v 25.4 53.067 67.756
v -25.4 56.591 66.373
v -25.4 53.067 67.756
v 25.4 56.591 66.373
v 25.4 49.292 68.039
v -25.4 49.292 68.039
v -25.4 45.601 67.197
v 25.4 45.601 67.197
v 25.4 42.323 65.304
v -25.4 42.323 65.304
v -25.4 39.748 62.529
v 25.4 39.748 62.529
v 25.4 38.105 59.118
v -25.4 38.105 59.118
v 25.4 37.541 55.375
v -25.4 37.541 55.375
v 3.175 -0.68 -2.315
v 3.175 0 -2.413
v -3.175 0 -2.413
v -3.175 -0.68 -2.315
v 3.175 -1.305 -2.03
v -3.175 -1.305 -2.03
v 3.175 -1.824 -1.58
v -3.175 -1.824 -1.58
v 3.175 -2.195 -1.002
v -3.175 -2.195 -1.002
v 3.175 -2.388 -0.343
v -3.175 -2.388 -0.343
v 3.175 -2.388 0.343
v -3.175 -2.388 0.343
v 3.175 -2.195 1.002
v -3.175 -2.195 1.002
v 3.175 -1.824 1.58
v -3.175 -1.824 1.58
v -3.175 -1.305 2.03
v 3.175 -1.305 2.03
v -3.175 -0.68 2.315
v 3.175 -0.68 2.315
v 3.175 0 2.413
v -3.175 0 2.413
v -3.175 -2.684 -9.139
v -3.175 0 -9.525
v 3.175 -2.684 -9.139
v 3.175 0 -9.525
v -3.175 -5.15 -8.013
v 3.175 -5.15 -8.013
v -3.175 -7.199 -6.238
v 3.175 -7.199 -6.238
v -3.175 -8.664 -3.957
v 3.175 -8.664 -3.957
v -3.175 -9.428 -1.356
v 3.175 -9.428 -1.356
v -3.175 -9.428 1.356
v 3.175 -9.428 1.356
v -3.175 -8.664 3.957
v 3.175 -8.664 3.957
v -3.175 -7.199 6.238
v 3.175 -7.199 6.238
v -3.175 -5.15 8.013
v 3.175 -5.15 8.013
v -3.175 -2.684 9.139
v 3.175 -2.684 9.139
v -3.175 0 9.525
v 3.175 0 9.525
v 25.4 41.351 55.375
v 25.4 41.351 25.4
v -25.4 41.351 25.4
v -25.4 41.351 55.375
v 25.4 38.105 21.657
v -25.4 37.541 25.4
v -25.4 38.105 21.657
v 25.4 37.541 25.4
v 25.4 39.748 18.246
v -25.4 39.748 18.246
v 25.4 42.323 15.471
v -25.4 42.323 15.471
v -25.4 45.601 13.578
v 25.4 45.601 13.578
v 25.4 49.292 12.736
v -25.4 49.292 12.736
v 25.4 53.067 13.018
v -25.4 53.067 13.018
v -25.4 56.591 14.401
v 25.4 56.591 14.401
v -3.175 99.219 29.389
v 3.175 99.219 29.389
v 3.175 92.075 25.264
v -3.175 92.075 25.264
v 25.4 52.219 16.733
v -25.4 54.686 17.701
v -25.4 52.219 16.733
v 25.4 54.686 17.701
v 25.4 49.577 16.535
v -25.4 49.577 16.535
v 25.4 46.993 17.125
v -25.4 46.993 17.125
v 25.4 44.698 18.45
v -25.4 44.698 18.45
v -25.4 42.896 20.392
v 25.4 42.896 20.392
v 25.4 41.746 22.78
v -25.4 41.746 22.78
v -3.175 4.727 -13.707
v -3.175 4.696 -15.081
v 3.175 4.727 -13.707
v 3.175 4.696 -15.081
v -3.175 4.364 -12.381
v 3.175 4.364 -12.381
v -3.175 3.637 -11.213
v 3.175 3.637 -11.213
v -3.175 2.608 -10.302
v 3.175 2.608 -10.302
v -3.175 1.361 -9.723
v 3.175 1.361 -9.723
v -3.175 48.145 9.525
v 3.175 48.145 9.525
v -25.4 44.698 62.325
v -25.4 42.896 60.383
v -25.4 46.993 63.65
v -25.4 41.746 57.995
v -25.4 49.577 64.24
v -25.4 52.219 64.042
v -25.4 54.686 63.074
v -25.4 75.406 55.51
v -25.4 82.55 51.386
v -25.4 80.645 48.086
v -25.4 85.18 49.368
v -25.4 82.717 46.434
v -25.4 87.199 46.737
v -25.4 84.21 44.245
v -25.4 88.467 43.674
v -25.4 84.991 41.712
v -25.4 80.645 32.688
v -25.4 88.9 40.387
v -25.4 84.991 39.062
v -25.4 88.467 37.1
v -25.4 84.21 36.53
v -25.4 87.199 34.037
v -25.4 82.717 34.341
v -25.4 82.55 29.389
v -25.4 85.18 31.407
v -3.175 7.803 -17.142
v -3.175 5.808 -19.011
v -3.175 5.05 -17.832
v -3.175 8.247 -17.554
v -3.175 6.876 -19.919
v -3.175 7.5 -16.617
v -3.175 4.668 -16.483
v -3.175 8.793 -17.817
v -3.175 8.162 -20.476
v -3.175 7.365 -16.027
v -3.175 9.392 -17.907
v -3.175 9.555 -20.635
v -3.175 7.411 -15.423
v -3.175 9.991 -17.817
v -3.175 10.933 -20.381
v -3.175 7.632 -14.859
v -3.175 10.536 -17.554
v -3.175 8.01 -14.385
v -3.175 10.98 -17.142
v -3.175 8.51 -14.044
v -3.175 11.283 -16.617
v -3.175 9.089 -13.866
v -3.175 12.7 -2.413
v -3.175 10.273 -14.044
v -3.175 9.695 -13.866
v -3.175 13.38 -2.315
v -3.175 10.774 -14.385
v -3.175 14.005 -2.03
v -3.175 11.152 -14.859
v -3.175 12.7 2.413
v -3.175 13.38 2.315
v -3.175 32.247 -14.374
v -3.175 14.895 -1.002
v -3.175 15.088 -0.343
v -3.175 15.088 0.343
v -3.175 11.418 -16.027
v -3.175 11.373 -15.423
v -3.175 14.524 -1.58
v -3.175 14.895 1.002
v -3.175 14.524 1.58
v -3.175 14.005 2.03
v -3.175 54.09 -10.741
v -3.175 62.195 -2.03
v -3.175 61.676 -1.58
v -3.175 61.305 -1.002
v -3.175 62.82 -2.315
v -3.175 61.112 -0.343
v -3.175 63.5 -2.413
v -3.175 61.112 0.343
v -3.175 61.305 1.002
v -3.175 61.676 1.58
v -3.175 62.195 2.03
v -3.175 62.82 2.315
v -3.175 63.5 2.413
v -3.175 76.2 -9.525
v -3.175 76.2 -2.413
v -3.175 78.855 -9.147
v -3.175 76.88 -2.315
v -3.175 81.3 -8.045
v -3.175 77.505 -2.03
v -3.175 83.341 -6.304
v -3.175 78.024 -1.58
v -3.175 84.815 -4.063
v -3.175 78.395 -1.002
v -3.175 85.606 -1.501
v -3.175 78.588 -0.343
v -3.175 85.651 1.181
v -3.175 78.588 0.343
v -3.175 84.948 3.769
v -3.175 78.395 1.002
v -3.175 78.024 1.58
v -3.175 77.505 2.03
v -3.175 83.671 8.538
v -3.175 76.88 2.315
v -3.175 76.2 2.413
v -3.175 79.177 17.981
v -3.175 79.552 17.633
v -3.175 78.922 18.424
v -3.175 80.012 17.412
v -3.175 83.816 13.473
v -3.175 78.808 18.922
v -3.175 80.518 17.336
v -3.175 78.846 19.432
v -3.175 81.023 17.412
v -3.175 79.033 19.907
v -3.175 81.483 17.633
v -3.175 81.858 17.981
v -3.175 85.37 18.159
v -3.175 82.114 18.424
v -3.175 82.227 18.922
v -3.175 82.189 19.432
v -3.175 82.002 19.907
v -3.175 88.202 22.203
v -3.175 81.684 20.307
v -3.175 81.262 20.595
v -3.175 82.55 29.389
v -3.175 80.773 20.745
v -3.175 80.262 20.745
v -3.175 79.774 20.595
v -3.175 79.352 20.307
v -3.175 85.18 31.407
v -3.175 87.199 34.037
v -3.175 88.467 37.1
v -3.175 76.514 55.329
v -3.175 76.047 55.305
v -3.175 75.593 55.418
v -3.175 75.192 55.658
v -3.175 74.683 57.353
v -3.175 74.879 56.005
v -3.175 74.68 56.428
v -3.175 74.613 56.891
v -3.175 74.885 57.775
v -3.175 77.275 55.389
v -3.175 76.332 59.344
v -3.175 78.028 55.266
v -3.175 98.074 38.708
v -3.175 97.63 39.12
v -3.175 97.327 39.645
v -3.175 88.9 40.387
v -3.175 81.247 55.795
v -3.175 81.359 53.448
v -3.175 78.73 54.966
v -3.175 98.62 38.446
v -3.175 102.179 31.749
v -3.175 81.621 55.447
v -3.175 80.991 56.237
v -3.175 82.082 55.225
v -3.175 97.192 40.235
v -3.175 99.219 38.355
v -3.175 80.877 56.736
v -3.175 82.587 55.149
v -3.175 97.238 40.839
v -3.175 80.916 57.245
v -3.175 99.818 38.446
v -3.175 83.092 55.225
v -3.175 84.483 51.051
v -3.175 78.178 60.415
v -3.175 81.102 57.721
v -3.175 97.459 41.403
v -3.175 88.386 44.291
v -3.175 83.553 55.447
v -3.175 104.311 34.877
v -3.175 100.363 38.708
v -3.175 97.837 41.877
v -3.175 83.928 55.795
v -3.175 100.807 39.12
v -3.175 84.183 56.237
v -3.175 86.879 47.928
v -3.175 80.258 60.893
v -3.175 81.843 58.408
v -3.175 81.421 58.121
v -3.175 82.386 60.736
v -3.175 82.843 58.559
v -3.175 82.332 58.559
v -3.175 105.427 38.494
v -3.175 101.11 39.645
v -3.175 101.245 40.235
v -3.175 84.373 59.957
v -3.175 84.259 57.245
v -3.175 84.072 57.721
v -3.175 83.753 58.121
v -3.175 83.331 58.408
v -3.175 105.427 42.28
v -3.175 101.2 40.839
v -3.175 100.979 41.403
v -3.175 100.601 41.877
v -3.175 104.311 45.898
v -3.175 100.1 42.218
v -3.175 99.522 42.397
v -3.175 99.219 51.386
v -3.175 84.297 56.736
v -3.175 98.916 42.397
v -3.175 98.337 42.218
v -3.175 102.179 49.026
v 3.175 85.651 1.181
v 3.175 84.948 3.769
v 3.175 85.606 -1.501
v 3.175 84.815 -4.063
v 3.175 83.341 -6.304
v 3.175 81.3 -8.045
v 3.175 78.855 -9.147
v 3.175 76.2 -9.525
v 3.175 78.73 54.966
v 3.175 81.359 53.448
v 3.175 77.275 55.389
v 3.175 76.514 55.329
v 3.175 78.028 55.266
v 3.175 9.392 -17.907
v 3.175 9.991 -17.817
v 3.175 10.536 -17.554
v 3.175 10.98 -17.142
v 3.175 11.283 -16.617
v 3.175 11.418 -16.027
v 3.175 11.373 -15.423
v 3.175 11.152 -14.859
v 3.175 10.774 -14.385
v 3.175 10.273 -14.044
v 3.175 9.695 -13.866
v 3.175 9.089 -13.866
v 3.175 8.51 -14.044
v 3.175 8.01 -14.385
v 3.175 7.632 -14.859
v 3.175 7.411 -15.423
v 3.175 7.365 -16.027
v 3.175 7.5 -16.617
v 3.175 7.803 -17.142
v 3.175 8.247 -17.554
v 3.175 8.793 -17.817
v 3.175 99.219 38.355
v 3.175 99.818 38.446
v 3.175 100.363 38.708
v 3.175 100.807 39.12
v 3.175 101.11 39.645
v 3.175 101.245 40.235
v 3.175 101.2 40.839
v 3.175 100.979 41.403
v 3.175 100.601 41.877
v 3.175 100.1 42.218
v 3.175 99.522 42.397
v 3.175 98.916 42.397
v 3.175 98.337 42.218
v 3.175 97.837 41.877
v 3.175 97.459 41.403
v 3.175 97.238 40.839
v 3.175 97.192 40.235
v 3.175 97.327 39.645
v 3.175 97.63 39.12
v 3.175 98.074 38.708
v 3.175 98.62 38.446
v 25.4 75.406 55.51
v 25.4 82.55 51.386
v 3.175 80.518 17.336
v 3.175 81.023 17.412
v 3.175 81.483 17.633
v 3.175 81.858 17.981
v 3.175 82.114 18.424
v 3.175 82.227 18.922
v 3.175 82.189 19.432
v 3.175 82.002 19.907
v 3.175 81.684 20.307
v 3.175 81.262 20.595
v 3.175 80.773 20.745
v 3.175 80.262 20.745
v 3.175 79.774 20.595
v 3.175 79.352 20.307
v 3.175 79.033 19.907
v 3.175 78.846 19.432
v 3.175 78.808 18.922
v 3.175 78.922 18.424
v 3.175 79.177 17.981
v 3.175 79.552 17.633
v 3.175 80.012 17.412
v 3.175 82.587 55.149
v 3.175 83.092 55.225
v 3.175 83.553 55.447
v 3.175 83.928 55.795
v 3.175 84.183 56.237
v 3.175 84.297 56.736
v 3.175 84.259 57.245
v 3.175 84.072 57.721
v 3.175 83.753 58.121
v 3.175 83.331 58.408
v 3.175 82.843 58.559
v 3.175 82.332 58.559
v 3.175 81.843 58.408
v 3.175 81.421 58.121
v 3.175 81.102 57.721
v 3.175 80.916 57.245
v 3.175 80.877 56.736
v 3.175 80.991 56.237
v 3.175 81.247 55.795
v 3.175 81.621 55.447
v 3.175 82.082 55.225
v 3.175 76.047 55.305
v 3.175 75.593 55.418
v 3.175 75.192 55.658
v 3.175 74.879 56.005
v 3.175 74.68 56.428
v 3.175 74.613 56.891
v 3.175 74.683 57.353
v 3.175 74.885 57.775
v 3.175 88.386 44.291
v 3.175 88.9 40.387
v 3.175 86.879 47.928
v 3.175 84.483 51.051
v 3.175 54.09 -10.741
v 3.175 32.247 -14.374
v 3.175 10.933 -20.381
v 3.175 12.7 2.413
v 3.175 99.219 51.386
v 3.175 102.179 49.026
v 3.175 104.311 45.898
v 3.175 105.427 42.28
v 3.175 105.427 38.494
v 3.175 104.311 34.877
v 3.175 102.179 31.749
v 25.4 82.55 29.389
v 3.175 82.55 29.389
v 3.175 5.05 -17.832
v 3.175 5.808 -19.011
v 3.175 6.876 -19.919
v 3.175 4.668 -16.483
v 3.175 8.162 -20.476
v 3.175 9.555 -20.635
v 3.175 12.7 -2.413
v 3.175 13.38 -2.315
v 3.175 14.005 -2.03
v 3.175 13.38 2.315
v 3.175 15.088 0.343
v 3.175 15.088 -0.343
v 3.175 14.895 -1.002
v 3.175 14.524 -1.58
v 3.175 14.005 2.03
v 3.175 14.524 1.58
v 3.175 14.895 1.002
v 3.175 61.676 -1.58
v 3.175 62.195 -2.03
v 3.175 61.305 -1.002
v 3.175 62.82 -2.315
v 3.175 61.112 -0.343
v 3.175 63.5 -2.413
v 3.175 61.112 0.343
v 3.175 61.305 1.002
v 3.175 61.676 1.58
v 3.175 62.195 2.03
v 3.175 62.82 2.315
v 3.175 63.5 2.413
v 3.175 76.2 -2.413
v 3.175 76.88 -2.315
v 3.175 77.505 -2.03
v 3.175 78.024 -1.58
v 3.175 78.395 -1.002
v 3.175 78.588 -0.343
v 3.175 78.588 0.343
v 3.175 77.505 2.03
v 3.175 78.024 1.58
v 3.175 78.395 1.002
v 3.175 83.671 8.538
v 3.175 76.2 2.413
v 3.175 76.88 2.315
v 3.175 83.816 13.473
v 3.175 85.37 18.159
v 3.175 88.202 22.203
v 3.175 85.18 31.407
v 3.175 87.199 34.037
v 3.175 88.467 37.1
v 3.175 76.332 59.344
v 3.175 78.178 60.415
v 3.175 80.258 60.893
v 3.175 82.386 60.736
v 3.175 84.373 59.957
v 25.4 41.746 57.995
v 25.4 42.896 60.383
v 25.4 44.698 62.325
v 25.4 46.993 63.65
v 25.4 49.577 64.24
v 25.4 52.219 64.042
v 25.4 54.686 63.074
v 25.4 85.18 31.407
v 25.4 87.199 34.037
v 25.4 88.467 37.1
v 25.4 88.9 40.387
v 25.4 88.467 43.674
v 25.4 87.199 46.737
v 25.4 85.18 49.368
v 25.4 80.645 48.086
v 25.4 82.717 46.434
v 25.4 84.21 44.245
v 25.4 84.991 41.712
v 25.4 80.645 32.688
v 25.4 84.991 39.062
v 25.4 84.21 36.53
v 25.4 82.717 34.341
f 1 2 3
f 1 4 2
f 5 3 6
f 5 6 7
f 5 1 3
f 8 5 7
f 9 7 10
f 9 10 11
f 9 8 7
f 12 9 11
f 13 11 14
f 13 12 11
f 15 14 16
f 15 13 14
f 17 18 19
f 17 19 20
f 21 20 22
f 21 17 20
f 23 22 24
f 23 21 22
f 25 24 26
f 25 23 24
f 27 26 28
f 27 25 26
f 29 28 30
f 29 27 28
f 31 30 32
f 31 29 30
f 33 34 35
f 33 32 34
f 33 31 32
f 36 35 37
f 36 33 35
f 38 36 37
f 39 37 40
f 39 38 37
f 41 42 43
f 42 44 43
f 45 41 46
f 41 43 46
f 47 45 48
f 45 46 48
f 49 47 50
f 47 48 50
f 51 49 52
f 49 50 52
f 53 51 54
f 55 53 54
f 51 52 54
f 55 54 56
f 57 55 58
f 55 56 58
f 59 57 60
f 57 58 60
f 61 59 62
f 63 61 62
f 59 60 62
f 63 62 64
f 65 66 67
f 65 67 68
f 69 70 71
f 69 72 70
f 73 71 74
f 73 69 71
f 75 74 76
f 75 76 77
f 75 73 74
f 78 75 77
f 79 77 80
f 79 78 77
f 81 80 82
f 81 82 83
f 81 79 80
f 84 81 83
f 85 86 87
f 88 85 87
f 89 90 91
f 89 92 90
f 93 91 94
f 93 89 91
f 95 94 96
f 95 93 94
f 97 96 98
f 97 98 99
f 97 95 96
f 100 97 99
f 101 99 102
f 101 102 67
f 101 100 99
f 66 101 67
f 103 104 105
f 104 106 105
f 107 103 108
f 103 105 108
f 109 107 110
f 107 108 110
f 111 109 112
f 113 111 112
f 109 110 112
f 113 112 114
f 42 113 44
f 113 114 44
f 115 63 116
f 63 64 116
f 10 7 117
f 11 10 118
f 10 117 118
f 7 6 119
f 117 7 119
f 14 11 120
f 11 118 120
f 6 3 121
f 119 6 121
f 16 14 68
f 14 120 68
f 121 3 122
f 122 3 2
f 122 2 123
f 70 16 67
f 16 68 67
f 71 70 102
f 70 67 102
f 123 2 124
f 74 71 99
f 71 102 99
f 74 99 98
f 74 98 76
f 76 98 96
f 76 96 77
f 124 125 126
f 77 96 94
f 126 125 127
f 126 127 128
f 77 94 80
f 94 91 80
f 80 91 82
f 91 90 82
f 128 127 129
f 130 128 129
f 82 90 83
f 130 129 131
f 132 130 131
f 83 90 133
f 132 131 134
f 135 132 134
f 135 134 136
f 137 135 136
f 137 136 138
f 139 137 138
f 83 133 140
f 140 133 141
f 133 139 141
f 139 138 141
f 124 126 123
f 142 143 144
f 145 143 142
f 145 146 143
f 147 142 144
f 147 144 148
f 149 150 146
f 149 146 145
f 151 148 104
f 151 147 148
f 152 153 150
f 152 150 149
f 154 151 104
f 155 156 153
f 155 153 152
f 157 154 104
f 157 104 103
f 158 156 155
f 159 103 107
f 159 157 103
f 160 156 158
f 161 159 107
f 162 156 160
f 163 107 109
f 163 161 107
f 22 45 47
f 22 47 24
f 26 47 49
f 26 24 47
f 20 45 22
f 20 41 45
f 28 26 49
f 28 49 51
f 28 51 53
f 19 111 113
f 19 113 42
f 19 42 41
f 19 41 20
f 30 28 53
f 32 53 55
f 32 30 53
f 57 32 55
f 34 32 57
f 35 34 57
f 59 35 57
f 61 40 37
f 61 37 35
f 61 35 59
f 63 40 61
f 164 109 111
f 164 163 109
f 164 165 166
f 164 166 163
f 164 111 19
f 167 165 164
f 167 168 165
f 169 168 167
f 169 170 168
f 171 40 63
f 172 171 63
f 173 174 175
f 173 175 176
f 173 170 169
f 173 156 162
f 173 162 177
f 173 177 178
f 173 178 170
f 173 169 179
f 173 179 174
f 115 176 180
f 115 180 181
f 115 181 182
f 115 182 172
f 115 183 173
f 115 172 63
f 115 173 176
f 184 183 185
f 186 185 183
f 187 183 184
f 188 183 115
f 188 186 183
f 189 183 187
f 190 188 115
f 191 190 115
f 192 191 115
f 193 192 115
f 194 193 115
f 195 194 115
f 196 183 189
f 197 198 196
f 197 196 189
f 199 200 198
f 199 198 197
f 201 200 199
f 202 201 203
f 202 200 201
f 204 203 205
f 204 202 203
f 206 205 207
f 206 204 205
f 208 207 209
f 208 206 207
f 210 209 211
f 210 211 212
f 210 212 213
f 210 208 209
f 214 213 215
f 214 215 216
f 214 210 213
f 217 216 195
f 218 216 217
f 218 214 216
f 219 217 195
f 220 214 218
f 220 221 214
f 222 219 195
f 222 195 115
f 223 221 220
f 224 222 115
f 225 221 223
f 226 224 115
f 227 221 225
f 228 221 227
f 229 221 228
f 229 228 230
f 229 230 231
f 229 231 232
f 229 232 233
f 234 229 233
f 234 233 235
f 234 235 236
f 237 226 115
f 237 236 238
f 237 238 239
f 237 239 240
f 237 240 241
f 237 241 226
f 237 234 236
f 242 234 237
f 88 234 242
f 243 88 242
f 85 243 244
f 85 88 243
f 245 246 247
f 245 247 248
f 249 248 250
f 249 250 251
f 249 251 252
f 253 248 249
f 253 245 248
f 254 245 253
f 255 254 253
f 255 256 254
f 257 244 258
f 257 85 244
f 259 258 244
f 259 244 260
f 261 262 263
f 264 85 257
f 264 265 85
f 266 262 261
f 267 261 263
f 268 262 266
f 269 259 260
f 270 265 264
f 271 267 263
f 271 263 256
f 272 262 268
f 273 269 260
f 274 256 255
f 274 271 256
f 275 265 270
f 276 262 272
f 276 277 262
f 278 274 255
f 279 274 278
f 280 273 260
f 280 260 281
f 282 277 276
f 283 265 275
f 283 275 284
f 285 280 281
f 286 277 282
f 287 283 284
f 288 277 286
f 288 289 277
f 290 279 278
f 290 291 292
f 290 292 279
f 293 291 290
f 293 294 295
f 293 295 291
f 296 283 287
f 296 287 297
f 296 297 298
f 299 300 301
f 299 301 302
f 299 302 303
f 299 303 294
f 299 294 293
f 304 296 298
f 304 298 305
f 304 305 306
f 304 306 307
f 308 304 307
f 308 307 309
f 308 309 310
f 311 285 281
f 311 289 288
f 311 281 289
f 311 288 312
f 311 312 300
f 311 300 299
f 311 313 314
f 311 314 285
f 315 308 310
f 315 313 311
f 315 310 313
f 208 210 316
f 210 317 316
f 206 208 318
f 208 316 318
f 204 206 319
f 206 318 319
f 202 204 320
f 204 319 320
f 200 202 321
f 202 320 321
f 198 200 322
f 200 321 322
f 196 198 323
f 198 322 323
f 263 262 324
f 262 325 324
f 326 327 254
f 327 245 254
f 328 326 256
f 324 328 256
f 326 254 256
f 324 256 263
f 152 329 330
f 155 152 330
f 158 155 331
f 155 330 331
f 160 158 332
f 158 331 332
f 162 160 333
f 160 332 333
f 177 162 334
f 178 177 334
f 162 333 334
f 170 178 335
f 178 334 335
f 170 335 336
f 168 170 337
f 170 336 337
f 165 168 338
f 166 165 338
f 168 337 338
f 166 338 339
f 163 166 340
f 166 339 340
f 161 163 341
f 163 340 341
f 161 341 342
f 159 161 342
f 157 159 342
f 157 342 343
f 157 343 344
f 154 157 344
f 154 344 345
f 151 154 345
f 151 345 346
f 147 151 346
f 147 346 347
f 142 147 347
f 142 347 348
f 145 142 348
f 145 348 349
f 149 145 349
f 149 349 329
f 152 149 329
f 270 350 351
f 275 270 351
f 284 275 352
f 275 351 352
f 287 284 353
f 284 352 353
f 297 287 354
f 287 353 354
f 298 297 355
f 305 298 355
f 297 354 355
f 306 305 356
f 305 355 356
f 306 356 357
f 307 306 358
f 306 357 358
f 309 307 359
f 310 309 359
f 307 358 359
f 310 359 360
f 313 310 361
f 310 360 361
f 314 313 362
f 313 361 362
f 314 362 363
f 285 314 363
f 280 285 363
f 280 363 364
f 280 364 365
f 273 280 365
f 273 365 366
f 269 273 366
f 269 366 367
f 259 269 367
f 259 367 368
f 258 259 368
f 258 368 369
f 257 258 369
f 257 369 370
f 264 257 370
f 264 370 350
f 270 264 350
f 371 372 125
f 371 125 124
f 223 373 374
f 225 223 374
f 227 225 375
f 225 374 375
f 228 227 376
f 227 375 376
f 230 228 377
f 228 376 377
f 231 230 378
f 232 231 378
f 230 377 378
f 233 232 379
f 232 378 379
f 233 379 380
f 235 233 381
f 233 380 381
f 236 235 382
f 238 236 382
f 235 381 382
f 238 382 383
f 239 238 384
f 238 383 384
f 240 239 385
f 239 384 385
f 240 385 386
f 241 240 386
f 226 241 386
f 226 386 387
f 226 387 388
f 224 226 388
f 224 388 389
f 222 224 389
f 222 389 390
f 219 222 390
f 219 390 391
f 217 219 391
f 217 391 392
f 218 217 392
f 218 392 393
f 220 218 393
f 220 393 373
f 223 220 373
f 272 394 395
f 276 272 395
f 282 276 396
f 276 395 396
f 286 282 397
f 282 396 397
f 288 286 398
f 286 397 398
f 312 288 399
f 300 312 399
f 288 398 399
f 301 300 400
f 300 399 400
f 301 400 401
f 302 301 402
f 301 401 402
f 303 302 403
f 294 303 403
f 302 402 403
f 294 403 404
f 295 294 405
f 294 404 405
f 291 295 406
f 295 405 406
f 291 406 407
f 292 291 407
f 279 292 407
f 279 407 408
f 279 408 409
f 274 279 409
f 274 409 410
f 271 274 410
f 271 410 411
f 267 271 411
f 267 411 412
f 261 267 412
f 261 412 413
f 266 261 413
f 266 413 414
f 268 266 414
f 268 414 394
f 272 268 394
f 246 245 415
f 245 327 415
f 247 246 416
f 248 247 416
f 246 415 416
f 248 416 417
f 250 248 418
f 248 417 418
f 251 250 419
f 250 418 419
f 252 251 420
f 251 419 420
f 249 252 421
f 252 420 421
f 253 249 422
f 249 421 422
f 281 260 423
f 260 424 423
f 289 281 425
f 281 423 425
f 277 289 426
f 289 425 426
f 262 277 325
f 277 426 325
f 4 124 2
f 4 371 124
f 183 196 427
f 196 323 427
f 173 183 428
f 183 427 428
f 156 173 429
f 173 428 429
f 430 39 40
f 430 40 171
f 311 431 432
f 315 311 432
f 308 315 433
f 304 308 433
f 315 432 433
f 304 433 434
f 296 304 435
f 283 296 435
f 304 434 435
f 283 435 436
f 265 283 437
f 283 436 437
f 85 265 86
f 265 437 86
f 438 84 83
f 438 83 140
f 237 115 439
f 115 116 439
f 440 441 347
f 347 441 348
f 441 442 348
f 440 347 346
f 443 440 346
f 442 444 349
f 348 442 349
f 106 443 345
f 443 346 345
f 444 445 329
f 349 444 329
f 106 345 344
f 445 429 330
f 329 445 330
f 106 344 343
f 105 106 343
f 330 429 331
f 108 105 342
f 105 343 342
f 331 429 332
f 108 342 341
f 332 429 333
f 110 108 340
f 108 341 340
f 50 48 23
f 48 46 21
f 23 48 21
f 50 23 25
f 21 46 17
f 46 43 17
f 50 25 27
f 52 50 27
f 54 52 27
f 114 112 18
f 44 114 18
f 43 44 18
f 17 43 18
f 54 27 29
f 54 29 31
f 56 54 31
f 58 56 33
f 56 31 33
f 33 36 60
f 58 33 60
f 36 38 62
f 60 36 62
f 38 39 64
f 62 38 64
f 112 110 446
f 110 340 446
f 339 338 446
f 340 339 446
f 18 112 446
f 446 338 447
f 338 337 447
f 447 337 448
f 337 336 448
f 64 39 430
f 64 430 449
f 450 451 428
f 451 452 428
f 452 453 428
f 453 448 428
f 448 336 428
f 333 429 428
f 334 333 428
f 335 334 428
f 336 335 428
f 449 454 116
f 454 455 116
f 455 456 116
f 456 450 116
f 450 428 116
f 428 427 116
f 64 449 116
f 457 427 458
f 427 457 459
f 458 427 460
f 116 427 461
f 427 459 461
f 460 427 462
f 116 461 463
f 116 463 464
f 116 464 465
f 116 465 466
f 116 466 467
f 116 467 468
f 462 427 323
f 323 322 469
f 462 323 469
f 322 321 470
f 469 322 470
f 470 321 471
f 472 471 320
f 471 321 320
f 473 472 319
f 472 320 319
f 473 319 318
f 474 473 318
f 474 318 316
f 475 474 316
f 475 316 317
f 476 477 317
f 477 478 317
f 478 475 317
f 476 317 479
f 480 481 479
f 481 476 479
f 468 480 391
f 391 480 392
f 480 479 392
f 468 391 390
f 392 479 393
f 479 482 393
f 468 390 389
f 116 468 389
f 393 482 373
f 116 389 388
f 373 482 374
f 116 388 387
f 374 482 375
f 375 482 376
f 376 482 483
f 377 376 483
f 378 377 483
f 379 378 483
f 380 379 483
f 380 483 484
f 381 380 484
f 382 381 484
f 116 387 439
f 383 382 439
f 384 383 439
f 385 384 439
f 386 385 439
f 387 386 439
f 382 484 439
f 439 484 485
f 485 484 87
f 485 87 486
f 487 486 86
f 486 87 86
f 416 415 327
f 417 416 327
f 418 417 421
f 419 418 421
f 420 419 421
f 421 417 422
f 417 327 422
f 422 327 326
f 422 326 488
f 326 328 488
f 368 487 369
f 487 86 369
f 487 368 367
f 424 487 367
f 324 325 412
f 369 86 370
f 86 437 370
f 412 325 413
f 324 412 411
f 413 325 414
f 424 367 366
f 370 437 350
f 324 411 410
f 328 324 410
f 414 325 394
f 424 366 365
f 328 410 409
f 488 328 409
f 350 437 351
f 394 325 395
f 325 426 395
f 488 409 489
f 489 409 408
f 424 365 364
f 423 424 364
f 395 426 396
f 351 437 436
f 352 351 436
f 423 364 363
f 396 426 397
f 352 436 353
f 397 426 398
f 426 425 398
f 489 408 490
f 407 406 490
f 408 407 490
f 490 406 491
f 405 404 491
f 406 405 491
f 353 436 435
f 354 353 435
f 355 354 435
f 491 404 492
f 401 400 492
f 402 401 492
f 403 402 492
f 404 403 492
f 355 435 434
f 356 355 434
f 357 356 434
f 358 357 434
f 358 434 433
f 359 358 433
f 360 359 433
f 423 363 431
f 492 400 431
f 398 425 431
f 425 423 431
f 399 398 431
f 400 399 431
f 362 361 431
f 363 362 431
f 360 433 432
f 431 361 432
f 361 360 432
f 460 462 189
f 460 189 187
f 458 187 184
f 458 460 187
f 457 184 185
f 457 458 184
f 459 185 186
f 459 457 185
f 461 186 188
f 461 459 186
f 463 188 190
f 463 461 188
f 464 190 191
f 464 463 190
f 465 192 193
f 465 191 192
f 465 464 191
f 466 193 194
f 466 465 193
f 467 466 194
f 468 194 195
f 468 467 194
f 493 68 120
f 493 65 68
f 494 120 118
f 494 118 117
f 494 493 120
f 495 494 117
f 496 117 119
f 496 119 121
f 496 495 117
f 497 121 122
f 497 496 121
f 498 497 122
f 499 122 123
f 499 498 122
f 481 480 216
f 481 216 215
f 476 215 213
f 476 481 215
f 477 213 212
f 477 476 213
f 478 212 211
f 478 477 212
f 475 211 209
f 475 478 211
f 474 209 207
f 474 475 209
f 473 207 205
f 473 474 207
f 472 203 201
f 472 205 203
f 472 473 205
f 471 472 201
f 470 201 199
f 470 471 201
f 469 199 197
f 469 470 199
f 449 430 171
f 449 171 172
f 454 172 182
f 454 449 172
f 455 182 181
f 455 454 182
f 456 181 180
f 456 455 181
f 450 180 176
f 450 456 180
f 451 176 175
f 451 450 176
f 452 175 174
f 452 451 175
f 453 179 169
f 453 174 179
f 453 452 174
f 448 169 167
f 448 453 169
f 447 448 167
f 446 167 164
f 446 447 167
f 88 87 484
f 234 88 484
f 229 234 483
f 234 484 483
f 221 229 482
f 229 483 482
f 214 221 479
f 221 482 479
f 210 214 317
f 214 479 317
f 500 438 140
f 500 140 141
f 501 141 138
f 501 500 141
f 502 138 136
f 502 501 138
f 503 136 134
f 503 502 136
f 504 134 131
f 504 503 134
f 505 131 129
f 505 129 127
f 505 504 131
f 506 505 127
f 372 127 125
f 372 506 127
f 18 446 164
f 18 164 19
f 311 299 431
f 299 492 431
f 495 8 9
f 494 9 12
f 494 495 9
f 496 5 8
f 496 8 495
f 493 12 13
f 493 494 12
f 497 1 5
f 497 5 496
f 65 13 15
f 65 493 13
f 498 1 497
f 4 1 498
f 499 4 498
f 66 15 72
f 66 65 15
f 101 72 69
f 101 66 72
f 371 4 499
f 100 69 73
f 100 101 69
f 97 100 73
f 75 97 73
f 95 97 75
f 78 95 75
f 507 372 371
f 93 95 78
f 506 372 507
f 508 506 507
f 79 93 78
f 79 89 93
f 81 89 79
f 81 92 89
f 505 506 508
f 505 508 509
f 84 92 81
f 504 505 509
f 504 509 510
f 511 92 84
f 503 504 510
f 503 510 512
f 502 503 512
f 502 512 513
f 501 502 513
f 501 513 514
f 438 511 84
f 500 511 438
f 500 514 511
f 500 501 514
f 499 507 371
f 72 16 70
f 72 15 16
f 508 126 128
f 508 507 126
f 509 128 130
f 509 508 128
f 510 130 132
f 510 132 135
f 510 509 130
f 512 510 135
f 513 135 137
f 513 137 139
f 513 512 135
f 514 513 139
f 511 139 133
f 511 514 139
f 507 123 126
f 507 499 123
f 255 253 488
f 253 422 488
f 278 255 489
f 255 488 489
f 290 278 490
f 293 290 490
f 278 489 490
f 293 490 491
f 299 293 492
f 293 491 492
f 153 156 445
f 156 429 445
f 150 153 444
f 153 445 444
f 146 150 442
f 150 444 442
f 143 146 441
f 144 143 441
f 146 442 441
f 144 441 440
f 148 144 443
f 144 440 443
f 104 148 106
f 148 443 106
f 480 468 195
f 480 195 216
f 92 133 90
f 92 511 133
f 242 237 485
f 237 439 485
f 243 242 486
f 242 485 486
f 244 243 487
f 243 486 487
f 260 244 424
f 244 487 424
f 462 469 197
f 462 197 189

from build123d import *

# Parameters (mm, degrees)
BOSS_EXTRUDE1_DEPTH = 3.175
BOSS_EXTRUDE2_DEPTH = 25.4
SKETCH2_R           = 2.032
CUT_EXTRUDE1_DEPTH  = 129.823321873
FILLET1_R           = 3.175
SKETCH3_R           = 2.032
SKETCH3_R_2         = 1.7145
CUT_EXTRUDE2_DEPTH  = 129.823321873


with BuildPart() as part:
    # Sketch1 → Boss-Extrude1 (new, symmetric)
    with BuildSketch(Plane(origin=(0, 0, 0), x_dir=(0, 0, -1), z_dir=(1, 0, 0))):
        with BuildLine():
            Line((-9.525, 48.14489343), (-9.525, 0))
            ThreePointArc((-9.525, 0), (0, -9.525), (9.525, 0))
            ThreePointArc((9.525, 0), (11.213319469, 3.637419458), (15.08125, 4.695888328))
            ThreePointArc((15.08125, 4.695888328), (19.504344028, 6.308066524), (20.381065631, 10.933457162))
            ThreePointArc((20.381065631, 10.933457162), (12.25753337, 43.11837453), (9.525, 76.2))
            ThreePointArc((9.525, 76.2), (5.235660538, 84.156977047), (-3.769169813, 84.947513014))
            ThreePointArc((-3.769169813, 84.947513014), (-15.872465899, 84.422700464), (-25.264351554, 92.075))
            Line((-25.264351554, 92.075), (-29.38879754, 99.21875))
            ThreePointArc((-29.38879754, 99.21875), (-40.387320168, 105.56875), (-51.385842796, 99.21875))
            Line((-51.385842796, 99.21875), (-59.957040372, 84.373000316))
            ThreePointArc((-59.957040372, 84.373000316), (-60.732371985, 79.199965789), (-57.775027743, 74.885392767))
            ThreePointArc((-57.775027743, 74.885392767), (-56.529290563, 74.652888831), (-55.510288455, 75.406250566))
            ThreePointArc((-55.510288455, 75.406250566), (-55.312146583, 76.414384862), (-55.772855145, 77.332721718))
            Line((-55.772855145, 77.332721718), (-53.448065789, 81.359375))
            ThreePointArc((-53.448065789, 81.359375), (-47.927945168, 86.879495621), (-40.387320168, 88.9))
            ThreePointArc((-40.387320168, 88.9), (-34.037320168, 87.198522628), (-29.38879754, 82.55))
            Line((-29.38879754, 82.55), (-14.401477372, 56.5912))
            Line((-14.401477372, 56.5912), (-9.525, 48.14489343))
        make_face()
    extrude(amount=BOSS_EXTRUDE1_DEPTH, both=True)

    # Sketch2 → Cut-Extrude1 (cut, through all)
    with BuildSketch(Plane(origin=(3.175, 0, 0), x_dir=(0, 0, -1), z_dir=(1, 0, 0))):
        with Locations((15.875, 9.391776656)):
            Circle(SKETCH2_R)
        with BuildLine():
            Line((-2.413, 0), (-2.413, 12.7))
            ThreePointArc((-2.413, 12.7), (0, 15.113), (2.413, 12.7))
            Line((2.413, 12.7), (2.413, 0))
            ThreePointArc((2.413, 0), (0, -2.413), (-2.413, 0))
        make_face()
        with BuildLine():
            Line((2.413, 76.2), (2.413, 63.5))
            ThreePointArc((2.413, 63.5), (0, 61.087), (-2.413, 63.5))
            Line((-2.413, 63.5), (-2.413, 76.2))
            ThreePointArc((-2.413, 76.2), (0, 78.613), (2.413, 76.2))
        make_face()
    extrude(amount=-CUT_EXTRUDE1_DEPTH, mode=Mode.SUBTRACT)

    # Fillet1
    fillet1_edges = [part.edges().sort_by_distance(p)[0] for p in [
        (0, 77.332721718, 55.772855145),
    ]]
    fillet(fillet1_edges, radius=FILLET1_R)

    # Sketch3 → Cut-Extrude2 (cut, through all)
    with BuildSketch(Plane(origin=(3.175, 0, 0), x_dir=(0, 0, -1), z_dir=(1, 0, 0))):
        with Locations((-40.387320168, 99.21875)):
            Circle(SKETCH3_R)
        with Locations((-19.05, 80.517677372)):
            Circle(SKETCH3_R_2)
        with Locations((-56.863705883, 82.587062816)):
            Circle(SKETCH3_R_2)
    extrude(amount=-CUT_EXTRUDE2_DEPTH, mode=Mode.SUBTRACT)


with BuildPart() as body_2:
    # Sketch1<3> → Boss-Extrude2 (new, symmetric)
    with BuildSketch(Plane(origin=(0, 0, 0), x_dir=(0, 0, -1), z_dir=(1, 0, 0))):
        with BuildLine():
            ThreePointArc((-25.4, 37.5412), (-14.401477372, 43.8912), (-14.401477372, 56.5912))
            Line((-14.401477372, 56.5912), (-29.38879754, 82.55))
            ThreePointArc((-29.38879754, 82.55), (-34.037320168, 87.198522628), (-40.387320168, 88.9))
            ThreePointArc((-40.387320168, 88.9), (-46.737320168, 87.198522628), (-51.385842796, 82.55))
            Line((-51.385842796, 82.55), (-55.510288455, 75.406250566))
            Line((-55.510288455, 75.406250566), (-66.373162964, 56.5912))
            ThreePointArc((-66.373162964, 56.5912), (-66.373162964, 43.8912), (-55.374640336, 37.5412))
            Line((-55.374640336, 37.5412), (-25.4, 37.5412))
        make_face()
        with BuildLine():
            Line((-25.4, 41.3512), (-55.374640336, 41.3512))
            ThreePointArc((-55.374640336, 41.3512), (-63.073606175, 45.7962), (-63.073606175, 54.6862))
            Line((-63.073606175, 54.6862), (-48.086286007, 80.645))
            ThreePointArc((-48.086286007, 80.645), (-40.387320168, 85.09), (-32.688354328, 80.645))
            Line((-32.688354328, 80.645), (-17.70103416, 54.6862))
            ThreePointArc((-17.70103416, 54.6862), (-17.70103416, 45.7962), (-25.4, 41.3512))
        make_face(mode=Mode.SUBTRACT)
    extrude(amount=BOSS_EXTRUDE2_DEPTH, both=True)


solid = Compound([part.part, body_2.part])
